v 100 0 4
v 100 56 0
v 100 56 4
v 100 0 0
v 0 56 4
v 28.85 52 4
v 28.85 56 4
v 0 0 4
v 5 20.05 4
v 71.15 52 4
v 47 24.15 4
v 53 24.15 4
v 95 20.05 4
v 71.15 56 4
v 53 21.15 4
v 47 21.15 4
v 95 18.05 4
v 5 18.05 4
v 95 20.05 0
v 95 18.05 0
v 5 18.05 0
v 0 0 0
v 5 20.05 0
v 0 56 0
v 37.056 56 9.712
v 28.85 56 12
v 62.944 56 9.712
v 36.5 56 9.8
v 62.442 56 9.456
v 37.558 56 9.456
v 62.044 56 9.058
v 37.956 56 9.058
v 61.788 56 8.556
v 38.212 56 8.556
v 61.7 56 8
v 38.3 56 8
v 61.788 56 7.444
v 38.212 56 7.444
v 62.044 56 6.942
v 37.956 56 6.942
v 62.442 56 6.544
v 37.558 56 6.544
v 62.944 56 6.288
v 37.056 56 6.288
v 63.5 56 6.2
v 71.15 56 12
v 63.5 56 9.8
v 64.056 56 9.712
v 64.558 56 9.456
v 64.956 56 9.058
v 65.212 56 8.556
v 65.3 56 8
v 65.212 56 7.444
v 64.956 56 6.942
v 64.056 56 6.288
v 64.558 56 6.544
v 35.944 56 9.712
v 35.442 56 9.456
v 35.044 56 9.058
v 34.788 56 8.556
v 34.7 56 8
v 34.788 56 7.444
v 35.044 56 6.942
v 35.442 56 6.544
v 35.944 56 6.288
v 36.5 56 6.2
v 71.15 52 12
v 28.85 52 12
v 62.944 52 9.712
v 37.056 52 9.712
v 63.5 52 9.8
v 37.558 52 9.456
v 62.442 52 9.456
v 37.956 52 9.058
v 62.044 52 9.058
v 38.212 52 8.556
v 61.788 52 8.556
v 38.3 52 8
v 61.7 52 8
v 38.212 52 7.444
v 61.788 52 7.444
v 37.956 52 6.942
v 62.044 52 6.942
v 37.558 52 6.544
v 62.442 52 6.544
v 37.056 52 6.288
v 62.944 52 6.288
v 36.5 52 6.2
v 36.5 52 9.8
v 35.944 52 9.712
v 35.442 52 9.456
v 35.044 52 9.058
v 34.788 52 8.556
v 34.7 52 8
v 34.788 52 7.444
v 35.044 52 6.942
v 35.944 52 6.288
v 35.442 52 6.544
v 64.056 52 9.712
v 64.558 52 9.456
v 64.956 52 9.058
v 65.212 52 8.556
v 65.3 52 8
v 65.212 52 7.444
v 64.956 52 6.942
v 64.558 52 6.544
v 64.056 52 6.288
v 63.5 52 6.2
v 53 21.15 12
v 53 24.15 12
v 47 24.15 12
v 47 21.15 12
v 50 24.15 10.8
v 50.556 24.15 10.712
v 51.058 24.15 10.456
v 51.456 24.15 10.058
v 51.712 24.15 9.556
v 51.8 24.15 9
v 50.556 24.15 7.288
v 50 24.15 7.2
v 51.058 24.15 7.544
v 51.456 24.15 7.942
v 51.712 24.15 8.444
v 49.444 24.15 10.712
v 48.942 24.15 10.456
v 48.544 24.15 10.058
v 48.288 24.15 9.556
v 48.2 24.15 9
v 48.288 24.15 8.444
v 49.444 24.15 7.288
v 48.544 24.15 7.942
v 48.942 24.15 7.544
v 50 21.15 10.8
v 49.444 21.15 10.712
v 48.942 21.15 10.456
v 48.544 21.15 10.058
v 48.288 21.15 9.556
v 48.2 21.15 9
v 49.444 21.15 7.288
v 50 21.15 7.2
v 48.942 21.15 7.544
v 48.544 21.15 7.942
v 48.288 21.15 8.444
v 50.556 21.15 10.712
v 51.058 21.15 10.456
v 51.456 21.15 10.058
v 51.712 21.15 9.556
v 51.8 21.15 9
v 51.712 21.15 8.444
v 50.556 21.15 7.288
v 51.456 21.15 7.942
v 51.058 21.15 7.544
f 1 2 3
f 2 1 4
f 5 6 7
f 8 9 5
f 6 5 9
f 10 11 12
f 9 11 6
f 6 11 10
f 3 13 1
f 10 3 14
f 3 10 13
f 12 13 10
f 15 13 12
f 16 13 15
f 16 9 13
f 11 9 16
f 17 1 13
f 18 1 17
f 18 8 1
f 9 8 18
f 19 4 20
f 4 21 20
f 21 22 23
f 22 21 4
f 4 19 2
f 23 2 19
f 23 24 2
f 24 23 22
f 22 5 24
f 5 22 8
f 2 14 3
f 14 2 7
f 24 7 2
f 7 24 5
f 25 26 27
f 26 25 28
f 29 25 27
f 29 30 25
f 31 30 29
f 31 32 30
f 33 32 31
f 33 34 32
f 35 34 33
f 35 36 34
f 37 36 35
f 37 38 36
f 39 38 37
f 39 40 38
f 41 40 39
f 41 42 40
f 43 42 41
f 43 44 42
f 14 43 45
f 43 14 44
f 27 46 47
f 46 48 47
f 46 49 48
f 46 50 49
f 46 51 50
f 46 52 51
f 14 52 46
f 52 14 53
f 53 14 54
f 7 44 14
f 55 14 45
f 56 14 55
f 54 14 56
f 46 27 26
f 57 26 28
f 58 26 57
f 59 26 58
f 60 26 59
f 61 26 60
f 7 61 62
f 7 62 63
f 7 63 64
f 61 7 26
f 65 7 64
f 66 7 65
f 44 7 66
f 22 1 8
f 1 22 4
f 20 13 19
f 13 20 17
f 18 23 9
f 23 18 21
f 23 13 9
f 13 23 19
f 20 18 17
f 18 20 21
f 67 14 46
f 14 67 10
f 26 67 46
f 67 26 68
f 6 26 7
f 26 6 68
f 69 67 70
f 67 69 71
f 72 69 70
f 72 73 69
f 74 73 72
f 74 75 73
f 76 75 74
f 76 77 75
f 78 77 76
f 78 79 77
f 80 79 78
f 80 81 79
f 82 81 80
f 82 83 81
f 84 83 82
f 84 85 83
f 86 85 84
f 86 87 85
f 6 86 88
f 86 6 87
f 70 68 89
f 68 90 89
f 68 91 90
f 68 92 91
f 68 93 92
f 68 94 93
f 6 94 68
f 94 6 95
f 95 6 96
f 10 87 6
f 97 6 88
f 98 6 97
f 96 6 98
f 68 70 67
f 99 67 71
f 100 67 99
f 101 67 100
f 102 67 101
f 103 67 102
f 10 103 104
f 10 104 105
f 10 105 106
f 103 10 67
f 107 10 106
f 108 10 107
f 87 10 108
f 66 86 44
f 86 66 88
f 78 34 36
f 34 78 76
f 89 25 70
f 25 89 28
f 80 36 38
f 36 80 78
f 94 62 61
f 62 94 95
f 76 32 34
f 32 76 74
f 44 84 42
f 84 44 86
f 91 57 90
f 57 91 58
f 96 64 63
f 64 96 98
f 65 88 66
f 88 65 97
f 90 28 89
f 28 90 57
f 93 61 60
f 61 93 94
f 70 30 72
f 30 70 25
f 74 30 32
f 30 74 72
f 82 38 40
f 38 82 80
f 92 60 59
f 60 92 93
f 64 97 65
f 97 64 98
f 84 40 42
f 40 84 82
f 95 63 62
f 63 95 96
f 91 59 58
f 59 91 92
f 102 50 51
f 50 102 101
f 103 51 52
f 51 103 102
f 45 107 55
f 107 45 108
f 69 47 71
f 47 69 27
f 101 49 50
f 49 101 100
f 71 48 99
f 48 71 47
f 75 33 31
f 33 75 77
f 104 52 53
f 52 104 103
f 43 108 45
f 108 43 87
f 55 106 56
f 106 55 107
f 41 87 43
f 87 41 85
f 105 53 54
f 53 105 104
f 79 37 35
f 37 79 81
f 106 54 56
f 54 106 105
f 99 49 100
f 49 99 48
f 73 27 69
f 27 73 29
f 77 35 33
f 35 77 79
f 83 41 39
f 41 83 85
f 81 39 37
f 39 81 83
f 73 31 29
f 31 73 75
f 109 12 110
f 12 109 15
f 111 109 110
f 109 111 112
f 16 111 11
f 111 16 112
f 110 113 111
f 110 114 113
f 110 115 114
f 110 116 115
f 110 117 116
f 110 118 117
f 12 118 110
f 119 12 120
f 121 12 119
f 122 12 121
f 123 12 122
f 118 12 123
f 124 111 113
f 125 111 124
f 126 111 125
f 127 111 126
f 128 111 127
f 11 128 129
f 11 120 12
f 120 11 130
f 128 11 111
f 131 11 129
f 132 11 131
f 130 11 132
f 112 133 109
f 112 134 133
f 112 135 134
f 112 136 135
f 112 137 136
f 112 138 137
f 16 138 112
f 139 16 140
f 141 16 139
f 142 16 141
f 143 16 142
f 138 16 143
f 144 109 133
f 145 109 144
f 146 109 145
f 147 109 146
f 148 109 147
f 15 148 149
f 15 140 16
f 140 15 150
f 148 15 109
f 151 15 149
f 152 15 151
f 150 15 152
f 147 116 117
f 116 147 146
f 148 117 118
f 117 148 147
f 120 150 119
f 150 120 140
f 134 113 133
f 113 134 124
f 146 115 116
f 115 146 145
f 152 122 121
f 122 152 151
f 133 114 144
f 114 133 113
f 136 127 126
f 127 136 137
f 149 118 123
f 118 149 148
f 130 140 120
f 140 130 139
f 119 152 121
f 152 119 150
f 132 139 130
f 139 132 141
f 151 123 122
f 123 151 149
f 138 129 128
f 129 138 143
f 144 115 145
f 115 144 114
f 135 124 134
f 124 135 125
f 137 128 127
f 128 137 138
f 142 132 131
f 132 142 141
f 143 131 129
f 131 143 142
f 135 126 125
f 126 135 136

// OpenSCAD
$fn = 20;

v = 0.3;
// sirka
s = 100;

difference(){
    cube([s,56,4]);
    translate([5,42.3 / 2 - 3.1,-0.5]) 
    cube([90,2,5]);
}

difference(){
    translate([s/2 - 42.3/ 2,52,0]) cube([42.3,4,12]);
    translate([11.3/2 + 2 + s/2 - 42.3/ 2,56.5,8]) rotate(a = 90, v = [1,0,0]) cylinder(r=1.5 + v,h=5);
    translate([11.3/2 + 29 + s/2 - 42.3/ 2,56.5,8]) rotate(a = 90, v = [1,0,0]) cylinder(r=1.5 + v,h=5);
}

difference(){
    translate([s/2 - 3,42.3 / 2,4]) 
    cube([6,3,8]);
    translate([6/2 + s/2 - 3,5 + 42.3 / 2,4 + 5]) 
    rotate(a = 90, v = [1,0,0]) 
    cylinder(r=1.5 + v,h=6);
}
